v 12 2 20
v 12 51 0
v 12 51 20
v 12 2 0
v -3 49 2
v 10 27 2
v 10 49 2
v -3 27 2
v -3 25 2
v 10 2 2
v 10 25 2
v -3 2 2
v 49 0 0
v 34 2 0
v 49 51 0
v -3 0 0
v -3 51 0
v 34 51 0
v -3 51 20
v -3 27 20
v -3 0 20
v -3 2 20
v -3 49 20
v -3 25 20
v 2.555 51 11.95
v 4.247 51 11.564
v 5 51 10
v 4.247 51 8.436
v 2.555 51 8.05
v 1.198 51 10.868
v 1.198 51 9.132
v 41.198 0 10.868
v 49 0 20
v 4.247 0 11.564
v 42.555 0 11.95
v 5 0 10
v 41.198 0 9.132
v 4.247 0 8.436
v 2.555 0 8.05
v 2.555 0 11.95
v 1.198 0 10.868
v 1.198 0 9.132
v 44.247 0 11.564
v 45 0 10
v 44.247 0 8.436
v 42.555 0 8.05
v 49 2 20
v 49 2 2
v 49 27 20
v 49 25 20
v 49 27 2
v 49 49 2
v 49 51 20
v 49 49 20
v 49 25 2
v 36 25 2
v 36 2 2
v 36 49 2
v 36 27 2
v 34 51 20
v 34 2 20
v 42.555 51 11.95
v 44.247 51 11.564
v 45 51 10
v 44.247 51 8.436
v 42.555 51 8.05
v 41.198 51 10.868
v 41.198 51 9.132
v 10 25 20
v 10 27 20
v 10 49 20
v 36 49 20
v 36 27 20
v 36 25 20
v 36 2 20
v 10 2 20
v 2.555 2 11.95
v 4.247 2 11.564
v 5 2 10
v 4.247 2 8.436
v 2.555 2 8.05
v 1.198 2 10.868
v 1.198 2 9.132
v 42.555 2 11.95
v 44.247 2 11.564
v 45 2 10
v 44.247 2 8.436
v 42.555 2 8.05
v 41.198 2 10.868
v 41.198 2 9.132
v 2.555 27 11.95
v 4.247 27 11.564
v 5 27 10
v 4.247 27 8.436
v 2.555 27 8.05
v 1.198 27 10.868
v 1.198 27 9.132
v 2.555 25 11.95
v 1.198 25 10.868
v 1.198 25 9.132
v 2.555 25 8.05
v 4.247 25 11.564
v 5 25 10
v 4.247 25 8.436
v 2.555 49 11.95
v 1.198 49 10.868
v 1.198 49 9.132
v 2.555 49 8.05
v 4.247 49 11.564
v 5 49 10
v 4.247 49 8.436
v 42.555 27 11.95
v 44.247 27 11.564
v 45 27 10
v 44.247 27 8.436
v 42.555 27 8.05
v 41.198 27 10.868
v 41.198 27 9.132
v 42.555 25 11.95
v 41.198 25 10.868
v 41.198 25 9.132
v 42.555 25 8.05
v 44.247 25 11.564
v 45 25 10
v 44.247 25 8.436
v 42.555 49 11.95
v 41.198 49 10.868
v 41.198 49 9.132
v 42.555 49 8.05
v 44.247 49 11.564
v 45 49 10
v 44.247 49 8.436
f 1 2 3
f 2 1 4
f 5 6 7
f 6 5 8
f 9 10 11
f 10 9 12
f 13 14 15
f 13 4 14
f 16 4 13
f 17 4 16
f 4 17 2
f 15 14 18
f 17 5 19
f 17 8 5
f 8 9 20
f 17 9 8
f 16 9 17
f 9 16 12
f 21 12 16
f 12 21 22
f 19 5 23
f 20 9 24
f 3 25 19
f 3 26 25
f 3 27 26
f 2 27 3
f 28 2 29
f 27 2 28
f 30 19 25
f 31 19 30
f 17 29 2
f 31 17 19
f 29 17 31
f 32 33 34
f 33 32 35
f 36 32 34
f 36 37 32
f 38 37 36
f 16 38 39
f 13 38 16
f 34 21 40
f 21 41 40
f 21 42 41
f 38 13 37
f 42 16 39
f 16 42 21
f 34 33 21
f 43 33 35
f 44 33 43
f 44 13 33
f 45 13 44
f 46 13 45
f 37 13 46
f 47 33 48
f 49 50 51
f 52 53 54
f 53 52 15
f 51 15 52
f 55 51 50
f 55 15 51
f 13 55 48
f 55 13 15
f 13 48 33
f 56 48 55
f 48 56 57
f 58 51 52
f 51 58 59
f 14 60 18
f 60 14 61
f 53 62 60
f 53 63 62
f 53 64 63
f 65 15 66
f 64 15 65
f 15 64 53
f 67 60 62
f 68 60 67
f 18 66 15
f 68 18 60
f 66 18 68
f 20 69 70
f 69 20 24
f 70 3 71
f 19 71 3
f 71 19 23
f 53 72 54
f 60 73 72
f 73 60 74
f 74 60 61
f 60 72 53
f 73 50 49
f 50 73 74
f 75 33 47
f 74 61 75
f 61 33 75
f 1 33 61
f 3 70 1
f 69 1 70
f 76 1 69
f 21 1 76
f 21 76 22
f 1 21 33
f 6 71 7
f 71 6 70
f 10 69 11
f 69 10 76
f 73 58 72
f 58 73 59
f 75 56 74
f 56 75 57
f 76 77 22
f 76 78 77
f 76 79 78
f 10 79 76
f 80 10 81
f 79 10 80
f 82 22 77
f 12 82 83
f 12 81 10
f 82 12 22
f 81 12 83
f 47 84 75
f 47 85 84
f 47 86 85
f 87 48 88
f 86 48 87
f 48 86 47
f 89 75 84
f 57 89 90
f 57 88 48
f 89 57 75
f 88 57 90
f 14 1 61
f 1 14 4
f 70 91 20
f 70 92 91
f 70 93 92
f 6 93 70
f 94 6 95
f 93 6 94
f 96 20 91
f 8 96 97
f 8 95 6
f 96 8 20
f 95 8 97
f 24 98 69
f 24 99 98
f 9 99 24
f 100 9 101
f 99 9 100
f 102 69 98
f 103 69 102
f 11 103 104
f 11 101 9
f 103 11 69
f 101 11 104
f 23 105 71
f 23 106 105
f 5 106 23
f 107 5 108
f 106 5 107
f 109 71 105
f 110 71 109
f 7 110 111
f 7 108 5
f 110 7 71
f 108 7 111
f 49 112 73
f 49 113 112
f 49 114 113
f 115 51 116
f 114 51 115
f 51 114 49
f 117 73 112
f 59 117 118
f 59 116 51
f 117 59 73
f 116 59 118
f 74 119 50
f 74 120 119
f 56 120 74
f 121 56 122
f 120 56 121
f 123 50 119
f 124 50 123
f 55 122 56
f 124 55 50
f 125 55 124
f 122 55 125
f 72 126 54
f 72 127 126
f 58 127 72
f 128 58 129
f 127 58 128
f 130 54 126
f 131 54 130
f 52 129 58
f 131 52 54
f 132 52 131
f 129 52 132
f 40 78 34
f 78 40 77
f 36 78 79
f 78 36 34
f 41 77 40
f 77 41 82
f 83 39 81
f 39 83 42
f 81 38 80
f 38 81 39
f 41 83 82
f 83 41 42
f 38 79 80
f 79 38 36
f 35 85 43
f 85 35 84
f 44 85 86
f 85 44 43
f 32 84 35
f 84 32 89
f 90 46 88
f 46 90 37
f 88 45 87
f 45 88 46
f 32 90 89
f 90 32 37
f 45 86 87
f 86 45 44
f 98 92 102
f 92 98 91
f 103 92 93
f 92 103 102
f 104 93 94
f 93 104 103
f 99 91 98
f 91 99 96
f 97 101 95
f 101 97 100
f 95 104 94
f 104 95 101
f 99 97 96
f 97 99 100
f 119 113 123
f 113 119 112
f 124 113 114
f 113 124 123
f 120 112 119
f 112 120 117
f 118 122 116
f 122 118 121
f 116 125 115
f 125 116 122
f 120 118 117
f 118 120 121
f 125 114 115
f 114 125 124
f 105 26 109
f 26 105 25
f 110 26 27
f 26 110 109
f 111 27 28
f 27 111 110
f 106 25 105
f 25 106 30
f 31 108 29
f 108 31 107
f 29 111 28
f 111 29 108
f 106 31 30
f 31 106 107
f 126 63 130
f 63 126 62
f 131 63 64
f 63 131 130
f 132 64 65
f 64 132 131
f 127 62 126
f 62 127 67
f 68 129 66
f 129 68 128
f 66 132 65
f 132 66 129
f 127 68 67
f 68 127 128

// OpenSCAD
// bracket for servo - v0.1
pth = 2.0; // plate thikness
he = 47.0;
wz = 20.0;
wx = 22.0;
rh = 2.0;
xb = 13;

difference() {
  union() {
    // low panes
    translate([-3,0,0])          cube( [xb+pth, he+2*pth, pth ] );
    translate([10+wx+pth,0,0])  cube( [xb+pth, he+2*pth, pth ] );
    // high panes

    // Y-oriented panes
    // translate([0,0,0])           cube([pth,he+2*pth,wz]);
    translate([10,0,0])          cube([pth,he+2*pth,wz]);
    translate([10+wx+pth,0,0])   cube([pth,he+2*pth,wz]);
    //translate([20+wx+pth,0,0])   cube([pth,he+2*pth,wz]);

    // x-orienred panes
    translate([-3,0,0])             cube([2*xb+wx+2*pth,pth,wz]);
    translate([-3,25,0])            cube([xb+pth,pth,wz]);
    translate([-3,he+pth,0])        cube([xb+pth,pth,wz]);
    translate([10+wx+pth,25,0])     cube([xb+pth,pth,wz]);
    translate([10+wx+pth,he+pth,0]) cube([xb+pth,pth,wz]);
  }{
    // holes
    translate([ 3,     pth,wz/2]) rotate([90,0,0]) cylinder(r=rh,h=2*pth);
    translate([43,     pth,wz/2]) rotate([90,0,0]) cylinder(r=rh,h=2*pth);
    translate([ 3,  pth+25,wz/2]) rotate([90,0,0]) cylinder(r=rh,h=2*pth);
    translate([43,  pth+25,wz/2]) rotate([90,0,0]) cylinder(r=rh,h=2*pth);
    translate([ 3,2*pth+he,wz/2]) rotate([90,0,0]) cylinder(r=rh,h=2*pth);
    translate([43,2*pth+he,wz/2]) rotate([90,0,0]) cylinder(r=rh,h=2*pth);
  }
}

// translate([5,0,wz/2])   rotate([90,0,0]) cylinder(r=rh,h=pth);
